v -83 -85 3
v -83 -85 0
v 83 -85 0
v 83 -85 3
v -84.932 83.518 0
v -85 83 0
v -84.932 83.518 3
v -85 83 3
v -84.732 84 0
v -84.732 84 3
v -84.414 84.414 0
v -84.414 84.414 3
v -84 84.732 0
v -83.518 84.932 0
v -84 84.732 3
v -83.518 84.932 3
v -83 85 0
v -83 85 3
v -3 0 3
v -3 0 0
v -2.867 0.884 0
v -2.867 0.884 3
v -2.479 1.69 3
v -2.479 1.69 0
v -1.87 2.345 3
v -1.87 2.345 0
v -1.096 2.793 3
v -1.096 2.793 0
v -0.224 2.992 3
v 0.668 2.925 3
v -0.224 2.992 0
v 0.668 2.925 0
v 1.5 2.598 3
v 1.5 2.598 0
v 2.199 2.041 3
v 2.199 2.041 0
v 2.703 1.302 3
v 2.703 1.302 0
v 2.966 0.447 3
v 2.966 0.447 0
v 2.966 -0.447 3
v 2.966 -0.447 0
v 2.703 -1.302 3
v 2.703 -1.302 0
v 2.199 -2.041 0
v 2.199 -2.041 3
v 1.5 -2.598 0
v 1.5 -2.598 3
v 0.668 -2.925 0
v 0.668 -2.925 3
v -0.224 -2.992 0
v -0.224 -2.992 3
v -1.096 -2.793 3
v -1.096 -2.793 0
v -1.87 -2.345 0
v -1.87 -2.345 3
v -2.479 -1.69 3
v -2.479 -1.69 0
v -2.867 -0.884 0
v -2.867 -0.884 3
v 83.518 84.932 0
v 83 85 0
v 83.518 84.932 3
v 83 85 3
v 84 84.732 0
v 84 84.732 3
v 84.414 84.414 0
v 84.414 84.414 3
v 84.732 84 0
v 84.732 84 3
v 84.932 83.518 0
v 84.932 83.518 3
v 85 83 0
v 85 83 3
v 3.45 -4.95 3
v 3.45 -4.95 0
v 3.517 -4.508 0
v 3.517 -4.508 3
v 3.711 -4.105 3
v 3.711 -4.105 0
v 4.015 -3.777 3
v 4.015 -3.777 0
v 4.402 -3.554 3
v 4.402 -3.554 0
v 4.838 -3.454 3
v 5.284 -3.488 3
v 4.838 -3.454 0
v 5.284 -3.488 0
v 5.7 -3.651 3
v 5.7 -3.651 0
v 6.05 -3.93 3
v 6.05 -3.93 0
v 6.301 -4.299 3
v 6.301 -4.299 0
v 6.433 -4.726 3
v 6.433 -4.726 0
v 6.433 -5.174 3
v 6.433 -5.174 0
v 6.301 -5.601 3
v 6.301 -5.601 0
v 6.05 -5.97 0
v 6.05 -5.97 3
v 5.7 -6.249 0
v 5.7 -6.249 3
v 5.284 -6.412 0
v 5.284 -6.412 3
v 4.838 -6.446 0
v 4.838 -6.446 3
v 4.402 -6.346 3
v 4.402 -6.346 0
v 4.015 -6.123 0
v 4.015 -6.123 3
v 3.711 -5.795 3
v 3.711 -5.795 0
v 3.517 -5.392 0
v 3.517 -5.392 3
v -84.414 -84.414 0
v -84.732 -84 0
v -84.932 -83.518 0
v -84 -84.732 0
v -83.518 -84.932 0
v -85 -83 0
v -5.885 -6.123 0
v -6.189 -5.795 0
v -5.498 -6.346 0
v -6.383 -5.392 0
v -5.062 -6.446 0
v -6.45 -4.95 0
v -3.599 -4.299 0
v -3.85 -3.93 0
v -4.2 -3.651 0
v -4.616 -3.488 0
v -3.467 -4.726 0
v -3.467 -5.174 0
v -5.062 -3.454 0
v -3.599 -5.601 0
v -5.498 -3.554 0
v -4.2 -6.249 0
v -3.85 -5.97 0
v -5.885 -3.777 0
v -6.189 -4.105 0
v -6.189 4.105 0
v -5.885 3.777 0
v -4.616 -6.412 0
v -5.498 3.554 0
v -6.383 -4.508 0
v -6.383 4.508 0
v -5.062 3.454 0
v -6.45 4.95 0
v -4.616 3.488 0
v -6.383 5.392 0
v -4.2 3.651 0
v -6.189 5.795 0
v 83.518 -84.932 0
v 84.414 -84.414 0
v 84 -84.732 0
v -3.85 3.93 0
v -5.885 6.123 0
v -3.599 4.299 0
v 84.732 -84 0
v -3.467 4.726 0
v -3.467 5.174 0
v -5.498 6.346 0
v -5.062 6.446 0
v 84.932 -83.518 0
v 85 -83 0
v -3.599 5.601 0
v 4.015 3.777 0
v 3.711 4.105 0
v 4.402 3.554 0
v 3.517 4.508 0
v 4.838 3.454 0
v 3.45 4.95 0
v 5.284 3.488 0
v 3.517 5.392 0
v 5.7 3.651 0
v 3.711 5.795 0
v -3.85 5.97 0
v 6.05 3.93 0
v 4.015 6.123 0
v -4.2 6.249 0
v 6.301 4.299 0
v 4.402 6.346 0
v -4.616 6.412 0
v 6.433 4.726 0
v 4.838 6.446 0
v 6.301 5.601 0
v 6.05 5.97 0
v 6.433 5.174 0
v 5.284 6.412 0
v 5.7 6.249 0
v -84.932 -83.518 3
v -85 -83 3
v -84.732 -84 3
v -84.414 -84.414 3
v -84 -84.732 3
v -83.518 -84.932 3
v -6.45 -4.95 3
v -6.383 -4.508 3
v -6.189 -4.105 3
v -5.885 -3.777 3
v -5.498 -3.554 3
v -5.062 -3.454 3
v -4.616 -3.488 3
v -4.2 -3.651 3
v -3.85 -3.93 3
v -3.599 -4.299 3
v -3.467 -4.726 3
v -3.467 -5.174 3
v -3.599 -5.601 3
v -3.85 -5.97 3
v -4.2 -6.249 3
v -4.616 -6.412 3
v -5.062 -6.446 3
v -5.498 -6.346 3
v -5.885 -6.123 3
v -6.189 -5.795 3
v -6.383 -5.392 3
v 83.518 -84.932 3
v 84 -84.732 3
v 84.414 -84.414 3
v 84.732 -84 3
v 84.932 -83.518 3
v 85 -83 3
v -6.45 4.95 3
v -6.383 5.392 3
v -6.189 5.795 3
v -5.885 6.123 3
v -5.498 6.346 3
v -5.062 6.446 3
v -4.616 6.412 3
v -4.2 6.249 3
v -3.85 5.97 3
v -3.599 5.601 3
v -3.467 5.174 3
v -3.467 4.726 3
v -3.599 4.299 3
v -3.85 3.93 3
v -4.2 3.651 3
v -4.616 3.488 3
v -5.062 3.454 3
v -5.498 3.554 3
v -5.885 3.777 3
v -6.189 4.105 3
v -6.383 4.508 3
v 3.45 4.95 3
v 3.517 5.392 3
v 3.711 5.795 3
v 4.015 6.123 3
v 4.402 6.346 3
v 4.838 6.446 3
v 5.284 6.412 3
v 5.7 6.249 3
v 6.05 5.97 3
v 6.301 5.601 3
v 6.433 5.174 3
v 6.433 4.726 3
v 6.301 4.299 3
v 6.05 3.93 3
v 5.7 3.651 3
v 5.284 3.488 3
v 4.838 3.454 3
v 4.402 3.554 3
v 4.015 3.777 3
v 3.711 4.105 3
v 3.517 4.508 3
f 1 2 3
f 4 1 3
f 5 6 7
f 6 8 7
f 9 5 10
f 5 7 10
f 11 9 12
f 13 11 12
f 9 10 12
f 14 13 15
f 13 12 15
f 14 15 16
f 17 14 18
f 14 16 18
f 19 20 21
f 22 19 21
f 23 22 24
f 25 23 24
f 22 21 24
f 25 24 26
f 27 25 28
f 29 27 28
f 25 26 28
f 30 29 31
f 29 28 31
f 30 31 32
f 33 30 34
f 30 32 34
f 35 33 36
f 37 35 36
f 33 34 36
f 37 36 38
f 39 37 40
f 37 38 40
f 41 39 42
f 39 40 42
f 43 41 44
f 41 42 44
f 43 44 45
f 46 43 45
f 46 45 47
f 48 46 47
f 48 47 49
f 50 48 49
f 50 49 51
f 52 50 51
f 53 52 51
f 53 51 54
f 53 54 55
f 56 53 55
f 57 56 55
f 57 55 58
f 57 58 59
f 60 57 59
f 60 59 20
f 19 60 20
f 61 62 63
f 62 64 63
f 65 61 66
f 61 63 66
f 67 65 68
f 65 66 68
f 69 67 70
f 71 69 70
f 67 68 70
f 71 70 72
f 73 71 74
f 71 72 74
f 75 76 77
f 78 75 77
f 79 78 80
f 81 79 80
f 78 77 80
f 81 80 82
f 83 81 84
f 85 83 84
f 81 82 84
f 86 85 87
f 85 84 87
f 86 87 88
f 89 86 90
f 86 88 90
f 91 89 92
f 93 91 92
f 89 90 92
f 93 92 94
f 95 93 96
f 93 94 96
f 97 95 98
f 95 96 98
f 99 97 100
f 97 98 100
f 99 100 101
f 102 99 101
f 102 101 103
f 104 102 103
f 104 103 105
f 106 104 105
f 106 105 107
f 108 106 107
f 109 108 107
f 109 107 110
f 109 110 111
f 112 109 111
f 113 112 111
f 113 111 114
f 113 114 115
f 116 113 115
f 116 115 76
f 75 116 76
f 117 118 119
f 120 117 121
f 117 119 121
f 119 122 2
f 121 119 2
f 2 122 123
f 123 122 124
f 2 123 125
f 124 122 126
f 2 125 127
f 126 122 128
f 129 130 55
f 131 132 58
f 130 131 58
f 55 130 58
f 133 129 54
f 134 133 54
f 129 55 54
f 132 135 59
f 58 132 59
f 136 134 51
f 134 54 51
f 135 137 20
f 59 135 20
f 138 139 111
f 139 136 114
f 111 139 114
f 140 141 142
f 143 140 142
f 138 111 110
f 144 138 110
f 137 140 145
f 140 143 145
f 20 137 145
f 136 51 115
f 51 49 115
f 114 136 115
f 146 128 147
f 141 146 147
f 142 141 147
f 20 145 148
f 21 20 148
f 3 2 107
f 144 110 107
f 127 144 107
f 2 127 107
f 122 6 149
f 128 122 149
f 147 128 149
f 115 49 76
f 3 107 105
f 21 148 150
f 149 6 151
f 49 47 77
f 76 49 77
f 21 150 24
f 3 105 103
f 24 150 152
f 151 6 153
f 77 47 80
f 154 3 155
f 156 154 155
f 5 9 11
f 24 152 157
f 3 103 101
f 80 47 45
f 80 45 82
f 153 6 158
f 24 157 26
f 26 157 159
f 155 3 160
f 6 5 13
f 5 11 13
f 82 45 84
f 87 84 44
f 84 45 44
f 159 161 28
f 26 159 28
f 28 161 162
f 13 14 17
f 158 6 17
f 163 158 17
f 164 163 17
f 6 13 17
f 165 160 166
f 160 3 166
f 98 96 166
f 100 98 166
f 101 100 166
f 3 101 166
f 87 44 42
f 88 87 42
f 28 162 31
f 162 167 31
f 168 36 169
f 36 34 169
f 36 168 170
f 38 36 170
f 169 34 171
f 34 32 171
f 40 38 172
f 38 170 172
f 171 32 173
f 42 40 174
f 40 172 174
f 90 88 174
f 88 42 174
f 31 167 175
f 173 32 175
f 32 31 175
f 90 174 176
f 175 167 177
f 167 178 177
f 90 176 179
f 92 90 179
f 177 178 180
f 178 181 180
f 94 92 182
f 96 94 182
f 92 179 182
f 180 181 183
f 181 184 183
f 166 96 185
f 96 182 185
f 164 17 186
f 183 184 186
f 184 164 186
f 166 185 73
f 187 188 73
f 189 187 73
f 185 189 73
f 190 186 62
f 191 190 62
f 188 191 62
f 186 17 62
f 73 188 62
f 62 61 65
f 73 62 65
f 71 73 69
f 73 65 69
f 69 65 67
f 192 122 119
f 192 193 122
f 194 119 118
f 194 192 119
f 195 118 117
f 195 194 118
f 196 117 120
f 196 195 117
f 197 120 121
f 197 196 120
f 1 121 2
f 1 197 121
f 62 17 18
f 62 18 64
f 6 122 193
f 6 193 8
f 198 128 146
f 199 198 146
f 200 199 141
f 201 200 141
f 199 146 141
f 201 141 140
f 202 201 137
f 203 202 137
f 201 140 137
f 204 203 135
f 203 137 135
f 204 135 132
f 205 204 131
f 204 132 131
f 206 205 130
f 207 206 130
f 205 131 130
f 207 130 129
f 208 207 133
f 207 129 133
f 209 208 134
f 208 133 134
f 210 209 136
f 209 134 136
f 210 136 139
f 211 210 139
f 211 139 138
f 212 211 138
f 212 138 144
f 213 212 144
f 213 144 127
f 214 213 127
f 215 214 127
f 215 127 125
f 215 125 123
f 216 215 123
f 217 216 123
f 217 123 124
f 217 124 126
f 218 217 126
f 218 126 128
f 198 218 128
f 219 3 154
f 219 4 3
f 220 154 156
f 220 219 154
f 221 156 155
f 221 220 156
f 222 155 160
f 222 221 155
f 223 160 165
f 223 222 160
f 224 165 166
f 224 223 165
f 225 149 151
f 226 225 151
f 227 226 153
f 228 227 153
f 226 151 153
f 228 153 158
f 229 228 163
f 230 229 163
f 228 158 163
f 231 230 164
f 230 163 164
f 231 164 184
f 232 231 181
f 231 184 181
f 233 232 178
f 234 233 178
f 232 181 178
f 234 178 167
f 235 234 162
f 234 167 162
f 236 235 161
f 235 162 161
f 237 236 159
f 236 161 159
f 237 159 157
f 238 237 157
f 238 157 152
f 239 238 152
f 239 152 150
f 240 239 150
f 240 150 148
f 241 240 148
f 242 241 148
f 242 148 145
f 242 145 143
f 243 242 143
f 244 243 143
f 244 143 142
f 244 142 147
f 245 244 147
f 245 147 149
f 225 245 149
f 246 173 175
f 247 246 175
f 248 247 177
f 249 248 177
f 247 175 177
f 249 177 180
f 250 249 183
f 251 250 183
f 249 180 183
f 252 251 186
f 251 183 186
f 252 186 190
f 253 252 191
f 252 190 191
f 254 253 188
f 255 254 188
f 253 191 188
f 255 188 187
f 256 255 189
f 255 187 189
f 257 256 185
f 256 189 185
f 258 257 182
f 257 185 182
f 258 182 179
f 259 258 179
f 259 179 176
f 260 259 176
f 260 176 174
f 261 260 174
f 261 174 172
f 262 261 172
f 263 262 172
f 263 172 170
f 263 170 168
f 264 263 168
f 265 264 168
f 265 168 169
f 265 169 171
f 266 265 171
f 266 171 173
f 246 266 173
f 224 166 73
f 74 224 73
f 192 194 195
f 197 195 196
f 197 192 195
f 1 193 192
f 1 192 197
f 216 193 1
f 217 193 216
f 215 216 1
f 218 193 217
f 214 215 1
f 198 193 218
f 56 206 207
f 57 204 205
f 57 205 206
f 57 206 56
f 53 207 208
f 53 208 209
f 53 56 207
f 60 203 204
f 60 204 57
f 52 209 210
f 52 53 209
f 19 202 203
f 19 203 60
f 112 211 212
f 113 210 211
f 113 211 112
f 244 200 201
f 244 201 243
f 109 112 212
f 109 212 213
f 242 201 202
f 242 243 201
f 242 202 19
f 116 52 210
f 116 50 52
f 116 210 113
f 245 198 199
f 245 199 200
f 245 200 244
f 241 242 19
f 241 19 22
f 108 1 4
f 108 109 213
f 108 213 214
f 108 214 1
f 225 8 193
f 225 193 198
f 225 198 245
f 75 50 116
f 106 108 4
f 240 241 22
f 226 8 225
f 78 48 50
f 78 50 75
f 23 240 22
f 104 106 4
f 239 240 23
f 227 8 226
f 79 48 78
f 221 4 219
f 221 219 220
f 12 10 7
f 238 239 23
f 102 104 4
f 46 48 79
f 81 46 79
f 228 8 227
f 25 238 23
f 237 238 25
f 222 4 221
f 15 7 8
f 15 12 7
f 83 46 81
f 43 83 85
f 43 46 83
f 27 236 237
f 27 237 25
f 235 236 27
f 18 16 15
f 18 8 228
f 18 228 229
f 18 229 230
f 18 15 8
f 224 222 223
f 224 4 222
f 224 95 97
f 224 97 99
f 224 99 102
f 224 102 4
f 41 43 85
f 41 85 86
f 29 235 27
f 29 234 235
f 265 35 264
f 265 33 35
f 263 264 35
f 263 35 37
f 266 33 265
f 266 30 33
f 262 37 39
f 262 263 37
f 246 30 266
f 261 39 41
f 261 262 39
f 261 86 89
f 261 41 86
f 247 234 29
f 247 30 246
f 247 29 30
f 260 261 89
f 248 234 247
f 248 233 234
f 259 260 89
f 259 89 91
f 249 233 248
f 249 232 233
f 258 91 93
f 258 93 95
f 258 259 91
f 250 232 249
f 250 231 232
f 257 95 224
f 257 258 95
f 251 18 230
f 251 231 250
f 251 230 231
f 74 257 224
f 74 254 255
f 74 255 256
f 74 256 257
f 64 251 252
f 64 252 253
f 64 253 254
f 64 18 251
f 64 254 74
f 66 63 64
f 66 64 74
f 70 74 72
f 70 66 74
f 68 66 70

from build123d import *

# Parameters (mm, degrees)
SKETCH_1_W          = 170
SKETCH_1_H          = 170
EXTRUDE_1_DEPTH     = 3
SKETCH_3_R          = 3
SKETCH_3_R_2        = 1.5
CUT_EXTRUDE_1_DEPTH = 121.245582039
FILLET_1_R          = 2


with BuildPart() as part:
    # 草图1 → 凸台-拉伸1 (new body)
    with BuildSketch(Plane.XY):
        Rectangle(SKETCH_1_W, SKETCH_1_H)
    extrude(amount=EXTRUDE_1_DEPTH)

    # 草图3 → 切除-拉伸1 (cut, through all)
    with BuildSketch(Plane(origin=(0, 0, 0), x_dir=(-1, 0, 0), z_dir=(0, 0, -1))):
        Circle(SKETCH_3_R)
        with Locations((4.95, 4.95)):
            Circle(SKETCH_3_R_2)
        with Locations((-4.95, 4.95)):
            Circle(SKETCH_3_R_2)
        with Locations((-4.95, -4.95)):
            Circle(SKETCH_3_R_2)
        with Locations((4.95, -4.95)):
            Circle(SKETCH_3_R_2)
    extrude(amount=-CUT_EXTRUDE_1_DEPTH, mode=Mode.SUBTRACT)

    # 圆角1
    fillet_1_edges = [part.edges().sort_by_distance(p)[0] for p in [
        (-85, 85, 1.5),
        (85, 85, 1.5),
        (85, -85, 1.5),
        (-85, -85, 1.5),
    ]]
    fillet(fillet_1_edges, radius=FILLET_1_R)


solid = part.part
